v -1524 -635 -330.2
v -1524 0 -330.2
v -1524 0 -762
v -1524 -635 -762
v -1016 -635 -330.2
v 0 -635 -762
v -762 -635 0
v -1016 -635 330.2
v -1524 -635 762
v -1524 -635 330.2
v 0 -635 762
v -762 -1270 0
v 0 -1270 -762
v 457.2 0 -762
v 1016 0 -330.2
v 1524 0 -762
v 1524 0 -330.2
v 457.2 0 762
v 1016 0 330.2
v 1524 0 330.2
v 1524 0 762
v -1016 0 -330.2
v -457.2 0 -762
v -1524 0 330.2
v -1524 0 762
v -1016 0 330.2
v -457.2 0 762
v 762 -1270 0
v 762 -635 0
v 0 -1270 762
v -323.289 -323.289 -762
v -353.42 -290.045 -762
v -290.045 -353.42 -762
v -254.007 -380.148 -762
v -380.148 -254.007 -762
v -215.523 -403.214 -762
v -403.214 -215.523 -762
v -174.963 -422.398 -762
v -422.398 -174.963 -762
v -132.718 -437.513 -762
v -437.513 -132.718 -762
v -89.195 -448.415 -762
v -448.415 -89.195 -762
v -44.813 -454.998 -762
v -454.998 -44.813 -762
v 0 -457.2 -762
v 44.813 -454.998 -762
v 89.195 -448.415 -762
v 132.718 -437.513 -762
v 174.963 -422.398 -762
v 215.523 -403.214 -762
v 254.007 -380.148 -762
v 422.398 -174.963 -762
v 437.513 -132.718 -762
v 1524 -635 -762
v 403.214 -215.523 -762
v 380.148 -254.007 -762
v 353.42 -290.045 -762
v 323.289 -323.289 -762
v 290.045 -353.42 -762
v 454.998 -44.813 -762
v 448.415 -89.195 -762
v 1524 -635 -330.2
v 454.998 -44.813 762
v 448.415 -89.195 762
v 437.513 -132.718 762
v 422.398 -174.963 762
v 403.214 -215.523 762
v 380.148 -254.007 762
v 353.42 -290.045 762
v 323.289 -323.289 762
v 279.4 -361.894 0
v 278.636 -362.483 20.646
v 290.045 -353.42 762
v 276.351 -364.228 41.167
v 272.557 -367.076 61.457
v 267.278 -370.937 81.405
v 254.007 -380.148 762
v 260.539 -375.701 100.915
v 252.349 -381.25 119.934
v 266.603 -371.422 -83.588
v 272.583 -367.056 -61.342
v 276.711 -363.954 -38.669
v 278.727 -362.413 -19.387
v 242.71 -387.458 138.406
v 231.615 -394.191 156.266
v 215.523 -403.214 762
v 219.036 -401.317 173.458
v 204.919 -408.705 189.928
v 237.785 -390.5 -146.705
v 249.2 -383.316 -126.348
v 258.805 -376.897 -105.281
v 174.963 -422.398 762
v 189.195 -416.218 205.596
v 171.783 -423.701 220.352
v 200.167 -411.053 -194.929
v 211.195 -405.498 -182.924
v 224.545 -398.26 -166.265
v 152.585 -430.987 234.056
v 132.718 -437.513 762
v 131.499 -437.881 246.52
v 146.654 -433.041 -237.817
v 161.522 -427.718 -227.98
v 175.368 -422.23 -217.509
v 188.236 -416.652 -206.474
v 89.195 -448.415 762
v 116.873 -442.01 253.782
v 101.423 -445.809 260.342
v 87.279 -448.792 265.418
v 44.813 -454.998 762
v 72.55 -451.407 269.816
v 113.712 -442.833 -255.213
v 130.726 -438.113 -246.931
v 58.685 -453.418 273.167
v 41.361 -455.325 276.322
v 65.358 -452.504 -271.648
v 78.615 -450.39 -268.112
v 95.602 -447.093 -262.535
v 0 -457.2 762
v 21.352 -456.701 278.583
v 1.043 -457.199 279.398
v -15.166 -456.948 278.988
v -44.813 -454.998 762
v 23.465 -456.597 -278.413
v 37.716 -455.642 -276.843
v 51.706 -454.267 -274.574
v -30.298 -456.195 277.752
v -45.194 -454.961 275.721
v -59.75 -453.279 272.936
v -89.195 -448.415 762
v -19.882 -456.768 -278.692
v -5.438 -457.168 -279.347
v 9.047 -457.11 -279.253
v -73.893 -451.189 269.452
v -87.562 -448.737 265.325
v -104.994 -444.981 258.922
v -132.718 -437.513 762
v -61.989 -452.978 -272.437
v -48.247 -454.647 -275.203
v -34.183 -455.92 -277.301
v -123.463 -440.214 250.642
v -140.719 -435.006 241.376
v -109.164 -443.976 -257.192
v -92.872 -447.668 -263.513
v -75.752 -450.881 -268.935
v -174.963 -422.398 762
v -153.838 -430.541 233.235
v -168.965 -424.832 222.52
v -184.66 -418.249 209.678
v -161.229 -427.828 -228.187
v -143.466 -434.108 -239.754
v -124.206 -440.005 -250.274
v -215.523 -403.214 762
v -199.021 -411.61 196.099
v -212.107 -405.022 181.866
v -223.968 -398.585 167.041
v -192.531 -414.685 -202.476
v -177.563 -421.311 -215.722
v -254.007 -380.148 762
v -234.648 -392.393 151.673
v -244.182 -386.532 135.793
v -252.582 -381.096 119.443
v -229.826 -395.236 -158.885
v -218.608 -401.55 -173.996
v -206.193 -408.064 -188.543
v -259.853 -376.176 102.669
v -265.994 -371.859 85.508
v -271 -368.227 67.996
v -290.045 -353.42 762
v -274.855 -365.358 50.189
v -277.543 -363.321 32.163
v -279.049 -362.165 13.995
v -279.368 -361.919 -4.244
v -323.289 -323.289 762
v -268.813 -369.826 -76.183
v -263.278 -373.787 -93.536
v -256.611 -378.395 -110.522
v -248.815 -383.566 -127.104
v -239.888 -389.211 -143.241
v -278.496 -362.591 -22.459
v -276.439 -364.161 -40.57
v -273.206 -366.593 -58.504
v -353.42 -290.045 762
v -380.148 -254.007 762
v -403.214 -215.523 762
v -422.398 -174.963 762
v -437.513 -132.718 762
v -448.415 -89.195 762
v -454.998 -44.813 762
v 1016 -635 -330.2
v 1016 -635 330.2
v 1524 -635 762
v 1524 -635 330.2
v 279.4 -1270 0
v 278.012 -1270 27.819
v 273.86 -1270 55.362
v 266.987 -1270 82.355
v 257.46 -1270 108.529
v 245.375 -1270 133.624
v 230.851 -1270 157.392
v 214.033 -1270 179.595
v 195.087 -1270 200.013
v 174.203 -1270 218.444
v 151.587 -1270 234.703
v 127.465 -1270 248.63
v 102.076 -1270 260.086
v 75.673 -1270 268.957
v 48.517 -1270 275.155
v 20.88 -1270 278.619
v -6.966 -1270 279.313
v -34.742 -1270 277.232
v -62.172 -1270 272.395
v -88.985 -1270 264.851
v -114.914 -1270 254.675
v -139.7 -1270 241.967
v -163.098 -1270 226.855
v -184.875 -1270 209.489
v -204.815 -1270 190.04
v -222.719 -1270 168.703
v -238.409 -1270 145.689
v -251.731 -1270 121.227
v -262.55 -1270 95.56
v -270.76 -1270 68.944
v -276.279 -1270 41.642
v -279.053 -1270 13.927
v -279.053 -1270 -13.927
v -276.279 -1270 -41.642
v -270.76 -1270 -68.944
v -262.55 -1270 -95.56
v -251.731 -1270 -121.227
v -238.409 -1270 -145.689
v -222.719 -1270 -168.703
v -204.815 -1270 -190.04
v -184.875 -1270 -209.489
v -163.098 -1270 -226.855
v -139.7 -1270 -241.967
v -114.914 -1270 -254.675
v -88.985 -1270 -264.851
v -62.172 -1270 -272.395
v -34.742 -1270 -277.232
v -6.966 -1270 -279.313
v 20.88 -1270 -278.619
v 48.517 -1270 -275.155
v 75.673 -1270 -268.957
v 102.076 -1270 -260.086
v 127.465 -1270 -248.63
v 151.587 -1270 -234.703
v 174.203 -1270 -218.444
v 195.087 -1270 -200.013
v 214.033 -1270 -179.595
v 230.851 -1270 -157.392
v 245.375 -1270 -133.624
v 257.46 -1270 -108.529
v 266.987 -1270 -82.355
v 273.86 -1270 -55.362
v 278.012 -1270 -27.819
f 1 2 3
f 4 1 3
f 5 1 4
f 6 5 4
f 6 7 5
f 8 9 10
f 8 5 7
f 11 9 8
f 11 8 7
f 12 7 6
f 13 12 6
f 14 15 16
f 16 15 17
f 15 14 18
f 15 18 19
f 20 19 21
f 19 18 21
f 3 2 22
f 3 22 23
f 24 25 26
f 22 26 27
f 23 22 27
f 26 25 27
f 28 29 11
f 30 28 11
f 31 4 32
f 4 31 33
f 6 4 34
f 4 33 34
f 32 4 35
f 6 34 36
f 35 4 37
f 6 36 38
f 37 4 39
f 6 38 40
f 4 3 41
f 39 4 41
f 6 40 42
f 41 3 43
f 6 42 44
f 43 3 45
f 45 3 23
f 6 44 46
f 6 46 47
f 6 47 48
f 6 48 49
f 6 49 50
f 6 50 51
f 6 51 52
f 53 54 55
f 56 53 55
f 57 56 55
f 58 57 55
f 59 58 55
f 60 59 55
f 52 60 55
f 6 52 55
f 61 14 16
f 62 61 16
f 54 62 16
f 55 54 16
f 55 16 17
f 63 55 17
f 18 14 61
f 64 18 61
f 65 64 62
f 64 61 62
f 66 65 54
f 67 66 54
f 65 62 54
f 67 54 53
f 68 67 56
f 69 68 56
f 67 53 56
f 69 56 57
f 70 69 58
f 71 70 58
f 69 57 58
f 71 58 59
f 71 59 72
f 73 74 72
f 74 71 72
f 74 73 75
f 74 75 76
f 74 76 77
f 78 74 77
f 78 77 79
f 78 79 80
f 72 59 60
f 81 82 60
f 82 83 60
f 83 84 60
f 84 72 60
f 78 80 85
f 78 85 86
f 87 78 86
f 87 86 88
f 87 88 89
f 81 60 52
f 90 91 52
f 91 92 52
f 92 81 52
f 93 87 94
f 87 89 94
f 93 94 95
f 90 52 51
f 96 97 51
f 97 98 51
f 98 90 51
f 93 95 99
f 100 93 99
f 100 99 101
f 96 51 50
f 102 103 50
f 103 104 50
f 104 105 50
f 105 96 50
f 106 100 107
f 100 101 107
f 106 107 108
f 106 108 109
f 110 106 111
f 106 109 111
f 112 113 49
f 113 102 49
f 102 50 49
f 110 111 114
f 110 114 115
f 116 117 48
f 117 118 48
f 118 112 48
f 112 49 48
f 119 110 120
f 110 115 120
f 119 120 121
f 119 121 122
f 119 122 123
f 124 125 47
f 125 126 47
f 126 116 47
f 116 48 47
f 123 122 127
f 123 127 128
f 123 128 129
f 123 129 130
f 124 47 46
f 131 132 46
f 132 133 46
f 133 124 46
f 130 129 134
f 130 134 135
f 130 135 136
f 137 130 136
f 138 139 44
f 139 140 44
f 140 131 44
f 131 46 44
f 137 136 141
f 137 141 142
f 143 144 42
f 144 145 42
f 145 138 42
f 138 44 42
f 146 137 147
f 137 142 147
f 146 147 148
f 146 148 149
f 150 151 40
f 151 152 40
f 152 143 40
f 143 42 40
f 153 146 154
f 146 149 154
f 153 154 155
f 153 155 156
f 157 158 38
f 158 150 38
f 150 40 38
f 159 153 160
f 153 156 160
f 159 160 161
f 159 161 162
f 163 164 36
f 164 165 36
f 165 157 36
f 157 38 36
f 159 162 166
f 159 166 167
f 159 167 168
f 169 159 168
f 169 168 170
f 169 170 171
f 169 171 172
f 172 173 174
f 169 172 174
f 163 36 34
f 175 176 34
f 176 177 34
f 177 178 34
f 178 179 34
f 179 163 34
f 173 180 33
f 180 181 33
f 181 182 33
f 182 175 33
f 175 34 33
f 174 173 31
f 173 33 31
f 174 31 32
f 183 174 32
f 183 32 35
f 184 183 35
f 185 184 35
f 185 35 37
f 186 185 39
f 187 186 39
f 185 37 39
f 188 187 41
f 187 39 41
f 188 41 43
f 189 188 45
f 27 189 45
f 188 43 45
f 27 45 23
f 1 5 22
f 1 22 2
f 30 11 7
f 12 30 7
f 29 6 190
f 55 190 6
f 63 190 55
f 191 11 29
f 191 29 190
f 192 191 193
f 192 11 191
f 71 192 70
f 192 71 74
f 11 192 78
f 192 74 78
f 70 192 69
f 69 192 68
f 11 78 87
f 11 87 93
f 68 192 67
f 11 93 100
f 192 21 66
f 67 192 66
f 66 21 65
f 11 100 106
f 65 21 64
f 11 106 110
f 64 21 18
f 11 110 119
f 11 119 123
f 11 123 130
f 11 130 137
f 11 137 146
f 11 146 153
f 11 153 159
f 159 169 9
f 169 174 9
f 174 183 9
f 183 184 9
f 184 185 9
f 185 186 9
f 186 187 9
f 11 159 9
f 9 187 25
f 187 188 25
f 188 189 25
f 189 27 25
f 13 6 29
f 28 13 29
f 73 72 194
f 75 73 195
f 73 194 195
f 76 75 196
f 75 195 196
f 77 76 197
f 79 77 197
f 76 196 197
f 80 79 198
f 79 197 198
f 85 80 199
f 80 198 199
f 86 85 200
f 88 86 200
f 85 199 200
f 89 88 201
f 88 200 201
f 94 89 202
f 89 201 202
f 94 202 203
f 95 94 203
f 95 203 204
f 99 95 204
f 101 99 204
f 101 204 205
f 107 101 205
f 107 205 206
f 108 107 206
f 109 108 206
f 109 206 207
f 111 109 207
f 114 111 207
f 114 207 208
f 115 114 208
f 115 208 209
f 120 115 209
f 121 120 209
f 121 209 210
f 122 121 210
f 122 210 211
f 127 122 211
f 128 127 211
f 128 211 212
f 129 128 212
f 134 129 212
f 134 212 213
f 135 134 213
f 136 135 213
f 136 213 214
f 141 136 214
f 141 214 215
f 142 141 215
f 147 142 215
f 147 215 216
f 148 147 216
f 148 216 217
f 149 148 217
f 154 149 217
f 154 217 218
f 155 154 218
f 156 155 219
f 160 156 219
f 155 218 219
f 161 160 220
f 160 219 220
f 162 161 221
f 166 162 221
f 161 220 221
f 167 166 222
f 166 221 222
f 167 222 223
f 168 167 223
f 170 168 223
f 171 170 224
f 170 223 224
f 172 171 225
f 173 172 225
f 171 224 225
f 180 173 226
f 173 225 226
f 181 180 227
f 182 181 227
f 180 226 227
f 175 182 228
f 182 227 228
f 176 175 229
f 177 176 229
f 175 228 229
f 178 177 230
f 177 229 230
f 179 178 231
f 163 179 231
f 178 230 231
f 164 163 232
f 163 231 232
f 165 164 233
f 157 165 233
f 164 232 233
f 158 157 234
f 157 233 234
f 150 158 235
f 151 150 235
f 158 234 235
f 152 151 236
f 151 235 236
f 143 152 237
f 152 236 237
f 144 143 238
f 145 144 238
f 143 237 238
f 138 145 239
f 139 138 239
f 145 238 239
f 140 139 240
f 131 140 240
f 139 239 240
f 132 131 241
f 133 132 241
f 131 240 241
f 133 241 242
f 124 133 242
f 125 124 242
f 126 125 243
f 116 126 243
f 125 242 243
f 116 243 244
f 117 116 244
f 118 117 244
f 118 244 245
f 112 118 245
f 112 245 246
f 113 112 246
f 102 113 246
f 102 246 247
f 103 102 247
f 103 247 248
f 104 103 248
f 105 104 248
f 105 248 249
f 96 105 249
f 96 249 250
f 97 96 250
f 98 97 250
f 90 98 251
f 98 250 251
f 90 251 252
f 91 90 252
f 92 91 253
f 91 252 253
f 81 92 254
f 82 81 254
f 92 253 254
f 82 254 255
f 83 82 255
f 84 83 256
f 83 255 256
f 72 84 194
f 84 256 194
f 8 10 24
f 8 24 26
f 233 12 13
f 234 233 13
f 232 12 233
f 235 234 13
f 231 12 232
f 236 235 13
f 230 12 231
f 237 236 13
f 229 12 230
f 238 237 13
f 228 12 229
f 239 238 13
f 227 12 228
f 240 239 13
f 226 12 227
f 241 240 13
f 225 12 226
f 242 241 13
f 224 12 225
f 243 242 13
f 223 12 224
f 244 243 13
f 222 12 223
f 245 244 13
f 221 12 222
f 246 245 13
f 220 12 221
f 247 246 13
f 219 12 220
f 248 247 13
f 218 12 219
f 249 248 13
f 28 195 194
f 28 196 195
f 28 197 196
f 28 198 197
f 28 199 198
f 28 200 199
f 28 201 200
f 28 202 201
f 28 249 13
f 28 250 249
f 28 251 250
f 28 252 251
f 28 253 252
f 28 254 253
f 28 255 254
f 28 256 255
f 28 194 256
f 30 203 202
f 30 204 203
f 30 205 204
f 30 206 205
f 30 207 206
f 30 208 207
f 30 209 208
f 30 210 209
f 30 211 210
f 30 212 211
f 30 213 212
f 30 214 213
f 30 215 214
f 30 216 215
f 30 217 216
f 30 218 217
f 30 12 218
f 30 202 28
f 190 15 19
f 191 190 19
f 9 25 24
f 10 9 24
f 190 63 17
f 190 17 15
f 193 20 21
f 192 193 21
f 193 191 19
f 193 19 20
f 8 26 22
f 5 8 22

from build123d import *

# Parameters (mm, degrees)
F1_DEPTH = 635
F3_DEPTH = 1524.001
F5_DEPTH = 635
F6_R     = 279.4
F7_DEPTH = 1270.001


with BuildPart() as f1:
    # F0 (on Front) → F1 (new body)
    with BuildSketch(Plane.XZ):
        Polygon((-1524, -762), (1524, -762), (1524, -330.2), (1016, -330.2), (1016, 330.2), (1524, 330.2), (1524, 762), (-1524, 762), (-1524, 330.2), (-1016, 330.2), (-1016, -330.2), (-1524, -330.2), align=None)
    extrude(amount=F1_DEPTH)

    # F2 (on face) → F3 (cut, through all)
    with BuildSketch(Plane(origin=(0, 0, -762), x_dir=(1, 0, 0), z_dir=(0, 0, -1))):
        with BuildLine():
            Line((-457.2, 0), (457.2, 0))
            ThreePointArc((457.2, 0), (0, 457.2), (-457.2, 0))
        make_face()
    extrude(amount=-F3_DEPTH, mode=Mode.SUBTRACT)

    # F4 (on face) → F5 (join)
    with BuildSketch(Plane.XZ.offset(635)):
        Polygon((762, 0), (0, 762), (-762, 0), (0, -762), align=None)
    extrude(amount=F5_DEPTH)

    # F6 (on face) → F7 (cut, through all)
    with BuildSketch(Plane.XZ.offset(1270)):
        Circle(F6_R)
    extrude(amount=-F7_DEPTH, mode=Mode.SUBTRACT)


solid = f1.part
